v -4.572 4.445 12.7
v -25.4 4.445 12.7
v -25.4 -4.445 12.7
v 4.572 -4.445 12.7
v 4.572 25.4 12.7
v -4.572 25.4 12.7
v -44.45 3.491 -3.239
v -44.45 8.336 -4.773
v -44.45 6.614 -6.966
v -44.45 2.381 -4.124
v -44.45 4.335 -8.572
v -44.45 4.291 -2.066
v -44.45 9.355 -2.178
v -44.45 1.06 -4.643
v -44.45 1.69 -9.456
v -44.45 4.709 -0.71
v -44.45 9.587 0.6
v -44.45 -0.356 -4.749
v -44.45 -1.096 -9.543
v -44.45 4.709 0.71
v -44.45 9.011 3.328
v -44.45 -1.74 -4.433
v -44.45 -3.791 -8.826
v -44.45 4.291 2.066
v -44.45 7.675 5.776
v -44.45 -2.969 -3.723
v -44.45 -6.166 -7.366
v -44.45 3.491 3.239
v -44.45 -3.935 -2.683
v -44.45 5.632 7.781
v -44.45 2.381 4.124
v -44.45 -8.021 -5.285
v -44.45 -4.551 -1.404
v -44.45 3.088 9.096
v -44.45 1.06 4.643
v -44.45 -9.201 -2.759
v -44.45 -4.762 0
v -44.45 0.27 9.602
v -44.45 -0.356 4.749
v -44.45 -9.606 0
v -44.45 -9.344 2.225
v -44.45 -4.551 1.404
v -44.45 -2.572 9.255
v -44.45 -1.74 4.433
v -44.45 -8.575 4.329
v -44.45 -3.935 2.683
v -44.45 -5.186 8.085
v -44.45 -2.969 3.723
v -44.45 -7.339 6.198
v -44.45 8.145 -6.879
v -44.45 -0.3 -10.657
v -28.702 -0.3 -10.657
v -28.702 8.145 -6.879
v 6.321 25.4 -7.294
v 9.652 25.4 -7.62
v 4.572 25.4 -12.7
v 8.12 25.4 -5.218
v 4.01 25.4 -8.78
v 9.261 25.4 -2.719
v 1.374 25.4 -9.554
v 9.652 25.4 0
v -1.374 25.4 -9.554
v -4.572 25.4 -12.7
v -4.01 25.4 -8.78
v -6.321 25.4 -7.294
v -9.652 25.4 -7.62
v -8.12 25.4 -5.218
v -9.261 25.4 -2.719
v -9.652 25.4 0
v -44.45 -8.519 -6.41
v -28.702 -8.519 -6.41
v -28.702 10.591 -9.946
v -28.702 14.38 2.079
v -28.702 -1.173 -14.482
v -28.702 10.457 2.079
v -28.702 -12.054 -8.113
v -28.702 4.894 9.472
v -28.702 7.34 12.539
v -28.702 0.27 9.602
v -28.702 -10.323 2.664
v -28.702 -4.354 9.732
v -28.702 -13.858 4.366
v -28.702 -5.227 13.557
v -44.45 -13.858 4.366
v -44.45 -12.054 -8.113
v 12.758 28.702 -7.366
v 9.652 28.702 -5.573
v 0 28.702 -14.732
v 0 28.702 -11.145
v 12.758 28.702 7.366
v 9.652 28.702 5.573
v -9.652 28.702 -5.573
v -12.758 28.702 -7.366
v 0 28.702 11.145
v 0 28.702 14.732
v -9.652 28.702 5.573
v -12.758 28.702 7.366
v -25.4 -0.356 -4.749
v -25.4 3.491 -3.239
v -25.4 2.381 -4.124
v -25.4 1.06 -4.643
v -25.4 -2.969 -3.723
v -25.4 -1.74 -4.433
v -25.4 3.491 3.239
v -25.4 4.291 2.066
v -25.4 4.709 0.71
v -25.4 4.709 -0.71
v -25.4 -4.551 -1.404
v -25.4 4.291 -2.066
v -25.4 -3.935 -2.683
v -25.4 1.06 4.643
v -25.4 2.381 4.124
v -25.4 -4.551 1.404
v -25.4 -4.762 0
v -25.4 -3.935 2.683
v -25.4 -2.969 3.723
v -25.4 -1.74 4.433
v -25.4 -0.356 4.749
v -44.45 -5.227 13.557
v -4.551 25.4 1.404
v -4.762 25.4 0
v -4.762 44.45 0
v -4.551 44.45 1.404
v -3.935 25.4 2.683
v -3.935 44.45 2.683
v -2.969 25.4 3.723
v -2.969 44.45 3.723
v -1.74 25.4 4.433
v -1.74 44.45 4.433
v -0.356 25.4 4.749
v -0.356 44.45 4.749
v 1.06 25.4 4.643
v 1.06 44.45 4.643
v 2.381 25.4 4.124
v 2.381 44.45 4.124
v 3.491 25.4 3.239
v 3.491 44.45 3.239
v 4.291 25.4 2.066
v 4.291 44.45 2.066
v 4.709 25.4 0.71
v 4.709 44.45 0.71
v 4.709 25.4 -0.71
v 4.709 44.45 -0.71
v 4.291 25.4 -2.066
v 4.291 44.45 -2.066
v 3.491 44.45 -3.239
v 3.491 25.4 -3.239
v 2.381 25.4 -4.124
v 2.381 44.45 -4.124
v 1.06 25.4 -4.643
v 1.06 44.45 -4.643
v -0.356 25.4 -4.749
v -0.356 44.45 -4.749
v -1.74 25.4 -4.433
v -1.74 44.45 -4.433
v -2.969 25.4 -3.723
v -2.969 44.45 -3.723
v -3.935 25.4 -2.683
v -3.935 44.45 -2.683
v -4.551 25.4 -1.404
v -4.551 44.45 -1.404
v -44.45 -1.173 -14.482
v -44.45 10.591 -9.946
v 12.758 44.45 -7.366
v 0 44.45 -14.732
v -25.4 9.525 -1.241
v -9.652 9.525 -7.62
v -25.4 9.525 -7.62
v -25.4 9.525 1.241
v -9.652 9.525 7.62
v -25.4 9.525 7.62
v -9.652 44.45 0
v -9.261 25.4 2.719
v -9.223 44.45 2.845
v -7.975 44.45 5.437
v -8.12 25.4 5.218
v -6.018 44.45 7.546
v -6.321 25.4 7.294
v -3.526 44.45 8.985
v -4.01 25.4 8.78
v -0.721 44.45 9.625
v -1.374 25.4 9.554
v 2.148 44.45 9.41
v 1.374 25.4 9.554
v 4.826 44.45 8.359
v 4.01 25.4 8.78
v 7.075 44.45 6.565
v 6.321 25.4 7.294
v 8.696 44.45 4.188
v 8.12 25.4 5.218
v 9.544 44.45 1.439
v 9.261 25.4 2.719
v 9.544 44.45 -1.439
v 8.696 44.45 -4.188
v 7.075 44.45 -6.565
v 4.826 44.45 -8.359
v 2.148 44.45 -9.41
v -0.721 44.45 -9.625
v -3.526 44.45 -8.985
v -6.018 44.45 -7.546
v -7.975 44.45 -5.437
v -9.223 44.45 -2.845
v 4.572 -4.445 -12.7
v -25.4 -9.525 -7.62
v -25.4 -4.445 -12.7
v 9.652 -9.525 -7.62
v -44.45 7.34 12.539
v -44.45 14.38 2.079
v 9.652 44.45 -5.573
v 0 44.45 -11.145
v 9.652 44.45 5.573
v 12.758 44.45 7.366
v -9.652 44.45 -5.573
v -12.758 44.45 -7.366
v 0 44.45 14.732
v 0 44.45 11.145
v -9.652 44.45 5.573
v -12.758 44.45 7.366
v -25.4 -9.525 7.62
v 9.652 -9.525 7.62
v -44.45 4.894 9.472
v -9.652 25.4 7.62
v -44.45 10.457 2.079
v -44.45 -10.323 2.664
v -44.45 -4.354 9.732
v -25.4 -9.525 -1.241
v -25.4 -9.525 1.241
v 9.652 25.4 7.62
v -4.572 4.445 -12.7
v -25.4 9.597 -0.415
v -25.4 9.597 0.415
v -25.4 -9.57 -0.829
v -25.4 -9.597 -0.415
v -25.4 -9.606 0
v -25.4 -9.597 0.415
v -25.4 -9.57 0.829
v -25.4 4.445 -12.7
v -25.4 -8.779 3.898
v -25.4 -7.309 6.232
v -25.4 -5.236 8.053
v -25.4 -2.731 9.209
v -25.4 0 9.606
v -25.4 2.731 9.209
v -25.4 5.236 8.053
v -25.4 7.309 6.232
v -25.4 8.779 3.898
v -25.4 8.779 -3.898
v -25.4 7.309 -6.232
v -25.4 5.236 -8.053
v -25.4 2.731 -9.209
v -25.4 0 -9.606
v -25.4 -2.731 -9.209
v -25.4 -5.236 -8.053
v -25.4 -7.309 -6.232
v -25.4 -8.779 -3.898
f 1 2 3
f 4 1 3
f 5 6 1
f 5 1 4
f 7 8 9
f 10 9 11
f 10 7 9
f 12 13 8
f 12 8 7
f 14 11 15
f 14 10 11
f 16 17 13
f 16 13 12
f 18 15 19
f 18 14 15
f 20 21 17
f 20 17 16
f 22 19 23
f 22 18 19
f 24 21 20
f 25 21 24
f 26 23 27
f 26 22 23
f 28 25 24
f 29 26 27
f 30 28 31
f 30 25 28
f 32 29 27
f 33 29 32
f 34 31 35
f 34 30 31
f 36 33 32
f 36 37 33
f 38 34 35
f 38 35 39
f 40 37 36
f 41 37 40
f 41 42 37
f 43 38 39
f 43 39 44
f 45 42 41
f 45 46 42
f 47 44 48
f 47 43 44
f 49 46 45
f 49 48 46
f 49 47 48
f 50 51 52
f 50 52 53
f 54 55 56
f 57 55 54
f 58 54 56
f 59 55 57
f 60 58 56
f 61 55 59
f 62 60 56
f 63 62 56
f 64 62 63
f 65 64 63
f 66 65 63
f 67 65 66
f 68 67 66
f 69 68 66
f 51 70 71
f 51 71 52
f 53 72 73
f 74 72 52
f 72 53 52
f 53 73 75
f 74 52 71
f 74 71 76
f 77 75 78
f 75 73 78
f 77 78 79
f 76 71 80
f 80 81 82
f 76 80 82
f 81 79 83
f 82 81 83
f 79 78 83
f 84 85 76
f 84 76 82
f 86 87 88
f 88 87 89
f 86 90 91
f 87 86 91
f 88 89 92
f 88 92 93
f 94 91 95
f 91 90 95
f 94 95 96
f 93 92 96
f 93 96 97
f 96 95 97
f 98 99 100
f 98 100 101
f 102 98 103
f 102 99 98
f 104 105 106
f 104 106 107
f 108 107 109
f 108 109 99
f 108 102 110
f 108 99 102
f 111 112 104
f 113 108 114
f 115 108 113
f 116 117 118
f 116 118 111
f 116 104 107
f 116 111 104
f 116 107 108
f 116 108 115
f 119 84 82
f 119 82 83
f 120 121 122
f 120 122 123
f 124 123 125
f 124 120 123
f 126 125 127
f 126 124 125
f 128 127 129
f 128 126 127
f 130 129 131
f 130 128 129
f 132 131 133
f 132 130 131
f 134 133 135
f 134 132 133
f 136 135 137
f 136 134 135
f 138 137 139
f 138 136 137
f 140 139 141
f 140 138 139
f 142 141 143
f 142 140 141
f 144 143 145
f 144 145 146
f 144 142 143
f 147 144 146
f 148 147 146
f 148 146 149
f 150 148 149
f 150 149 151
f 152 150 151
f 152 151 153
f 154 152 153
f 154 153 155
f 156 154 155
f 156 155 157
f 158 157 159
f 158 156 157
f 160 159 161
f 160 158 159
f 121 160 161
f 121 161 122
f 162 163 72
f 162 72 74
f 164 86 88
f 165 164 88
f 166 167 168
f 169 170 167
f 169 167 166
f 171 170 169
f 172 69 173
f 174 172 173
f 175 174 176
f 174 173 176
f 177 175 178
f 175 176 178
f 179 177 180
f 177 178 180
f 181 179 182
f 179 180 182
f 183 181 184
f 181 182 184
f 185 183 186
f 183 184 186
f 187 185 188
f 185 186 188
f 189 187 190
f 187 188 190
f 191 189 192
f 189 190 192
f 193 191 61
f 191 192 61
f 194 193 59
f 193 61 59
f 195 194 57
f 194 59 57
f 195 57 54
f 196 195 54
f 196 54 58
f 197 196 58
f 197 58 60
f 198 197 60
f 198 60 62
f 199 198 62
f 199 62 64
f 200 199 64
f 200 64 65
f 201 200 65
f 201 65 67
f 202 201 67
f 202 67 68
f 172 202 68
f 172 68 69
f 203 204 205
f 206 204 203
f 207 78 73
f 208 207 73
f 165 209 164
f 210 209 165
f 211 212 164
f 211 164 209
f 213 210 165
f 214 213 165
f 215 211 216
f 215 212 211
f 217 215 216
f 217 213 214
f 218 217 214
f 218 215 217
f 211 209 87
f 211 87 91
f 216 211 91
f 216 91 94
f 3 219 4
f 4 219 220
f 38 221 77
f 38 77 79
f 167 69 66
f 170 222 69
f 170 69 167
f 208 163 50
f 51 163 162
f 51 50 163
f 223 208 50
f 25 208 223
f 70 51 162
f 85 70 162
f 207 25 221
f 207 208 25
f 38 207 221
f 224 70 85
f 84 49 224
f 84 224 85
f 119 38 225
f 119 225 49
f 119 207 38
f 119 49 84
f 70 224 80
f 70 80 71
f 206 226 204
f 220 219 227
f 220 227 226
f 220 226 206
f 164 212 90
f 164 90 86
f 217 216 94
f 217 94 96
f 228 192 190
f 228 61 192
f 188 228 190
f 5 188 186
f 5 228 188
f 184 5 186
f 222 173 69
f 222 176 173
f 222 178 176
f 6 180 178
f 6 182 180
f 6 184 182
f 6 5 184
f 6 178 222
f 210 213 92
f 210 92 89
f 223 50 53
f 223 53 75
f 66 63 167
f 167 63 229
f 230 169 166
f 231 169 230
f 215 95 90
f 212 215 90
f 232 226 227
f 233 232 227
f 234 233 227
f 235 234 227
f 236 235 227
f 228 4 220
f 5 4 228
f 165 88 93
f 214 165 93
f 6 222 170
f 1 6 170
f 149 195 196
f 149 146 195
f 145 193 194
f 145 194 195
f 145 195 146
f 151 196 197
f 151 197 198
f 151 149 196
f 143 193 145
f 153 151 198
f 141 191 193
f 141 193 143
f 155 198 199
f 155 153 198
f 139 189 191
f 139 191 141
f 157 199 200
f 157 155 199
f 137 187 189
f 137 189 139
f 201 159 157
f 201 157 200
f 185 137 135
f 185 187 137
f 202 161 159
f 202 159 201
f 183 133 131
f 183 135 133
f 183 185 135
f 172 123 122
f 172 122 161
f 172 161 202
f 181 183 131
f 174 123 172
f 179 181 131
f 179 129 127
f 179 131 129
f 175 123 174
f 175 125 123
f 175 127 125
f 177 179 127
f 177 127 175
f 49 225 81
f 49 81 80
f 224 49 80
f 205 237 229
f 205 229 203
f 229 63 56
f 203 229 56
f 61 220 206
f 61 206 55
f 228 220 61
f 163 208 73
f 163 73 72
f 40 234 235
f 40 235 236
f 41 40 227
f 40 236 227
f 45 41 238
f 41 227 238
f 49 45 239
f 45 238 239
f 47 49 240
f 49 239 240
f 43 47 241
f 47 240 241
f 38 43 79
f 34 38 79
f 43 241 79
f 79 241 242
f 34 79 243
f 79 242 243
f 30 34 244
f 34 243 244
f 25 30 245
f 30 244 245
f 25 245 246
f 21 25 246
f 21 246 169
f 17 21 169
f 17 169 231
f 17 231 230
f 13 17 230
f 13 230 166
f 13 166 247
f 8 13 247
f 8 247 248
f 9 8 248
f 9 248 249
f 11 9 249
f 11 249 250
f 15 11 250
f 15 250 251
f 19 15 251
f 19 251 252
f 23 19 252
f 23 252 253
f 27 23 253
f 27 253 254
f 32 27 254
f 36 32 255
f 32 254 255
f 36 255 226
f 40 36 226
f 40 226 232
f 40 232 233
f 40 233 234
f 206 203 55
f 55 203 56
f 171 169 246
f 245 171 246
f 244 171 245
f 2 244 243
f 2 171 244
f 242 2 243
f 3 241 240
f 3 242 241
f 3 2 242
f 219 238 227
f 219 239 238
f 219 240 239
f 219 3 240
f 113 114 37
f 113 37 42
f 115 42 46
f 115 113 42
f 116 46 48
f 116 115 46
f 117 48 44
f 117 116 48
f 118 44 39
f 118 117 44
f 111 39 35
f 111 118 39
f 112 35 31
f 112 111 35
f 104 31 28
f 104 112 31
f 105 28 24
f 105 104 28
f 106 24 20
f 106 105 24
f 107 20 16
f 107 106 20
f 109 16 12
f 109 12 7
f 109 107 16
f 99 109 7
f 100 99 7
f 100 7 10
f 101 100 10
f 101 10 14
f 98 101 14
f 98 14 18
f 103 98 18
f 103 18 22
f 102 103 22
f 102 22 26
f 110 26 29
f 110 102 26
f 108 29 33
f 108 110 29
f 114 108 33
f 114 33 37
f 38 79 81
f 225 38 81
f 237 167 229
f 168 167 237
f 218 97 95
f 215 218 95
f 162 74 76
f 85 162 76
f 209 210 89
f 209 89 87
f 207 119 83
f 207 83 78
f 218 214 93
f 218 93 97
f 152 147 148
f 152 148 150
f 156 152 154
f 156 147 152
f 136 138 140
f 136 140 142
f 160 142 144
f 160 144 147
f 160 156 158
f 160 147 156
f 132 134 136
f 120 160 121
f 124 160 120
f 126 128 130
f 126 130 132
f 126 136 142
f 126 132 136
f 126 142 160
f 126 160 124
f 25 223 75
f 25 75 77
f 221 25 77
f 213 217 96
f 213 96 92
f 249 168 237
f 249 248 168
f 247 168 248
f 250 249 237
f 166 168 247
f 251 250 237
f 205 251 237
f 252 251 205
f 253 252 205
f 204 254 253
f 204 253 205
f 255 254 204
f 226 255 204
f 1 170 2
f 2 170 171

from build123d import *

# Parameters (mm, degrees)
F1_DEPTH = 12.7
F2_R     = 9.605515
F2_R_2   = 4.7625
F3_DEPTH = 19.05
F5_DEPTH = 15.748
F6_R     = 9.652
F6_R_2   = 4.7625
F7_DEPTH = 19.05
F9_DEPTH = 15.748
F10_SIZE = 5.08


with BuildPart() as f1:
    # F0 (on Top) → F1 (new body, symmetric)
    with BuildSketch(Plane.XY):
        Polygon((-9.652, 9.525), (-25.4, 9.525), (-25.4, 0), (-25.4, -9.525), (9.652, -9.525), (9.652, 9.525), (9.652, 25.4), (0, 25.4), (-9.652, 25.4), align=None)
    extrude(amount=F1_DEPTH, both=True)

    # F2 (on face) → F3 (join)
    with BuildSketch(Plane(origin=(-25.4, 0, 0), x_dir=(0, -1, 0), z_dir=(-1, 0, 0))):
        Circle(F2_R)
        Circle(F2_R_2, mode=Mode.SUBTRACT)
    extrude(amount=F3_DEPTH)

    # F4 (on face) → F5 (join)
    with BuildSketch(Plane(origin=(-44.45, 0, 0), x_dir=(0, -1, 0), z_dir=(-1, 0, 0))):
        Polygon((12.053703, -8.112624), (13.858066, 4.365827), (5.227022, 13.55672), (-7.340076, 12.539127), (-14.379947, 2.079315), (-10.591424, -9.946263), (1.172657, -14.482103), align=None)
        Polygon((4.353991, 9.731724), (10.323238, 2.663543), (8.518875, -6.41034), (0.299626, -10.657107), (-8.145248, -6.878854), (-10.456584, 2.079315), (-4.893899, 9.471718), align=None, mode=Mode.SUBTRACT)
    extrude(amount=-F5_DEPTH)

    # F6 (on face) → F7 (join)
    with BuildSketch(Plane(origin=(0, 25.4, 0), x_dir=(-1, 0, 0), z_dir=(0, 1, 0))):
        Circle(F6_R)
        Circle(F6_R_2, mode=Mode.SUBTRACT)
    extrude(amount=F7_DEPTH)

    # F10
    f10_edges = [f1.edges().sort_by_distance(p)[0] for p in [
        (-17.526, 9.525, 12.7),
        (-7.874, -9.525, 12.7),
        (-9.652, 17.4625, 12.7),
        (9.652, 7.9375, 12.7),
        (9.652, 7.9375, -12.7),
        (-17.526, 9.525, -12.7),
        (-9.652, 17.4625, -12.7),
        (-7.874, -9.525, -12.7),
    ]]
    chamfer(f10_edges, length=F10_SIZE)


with BuildPart() as f9:
    # F8 (on face) → F9 (new body)
    with BuildSketch(Plane(origin=(0, 44.45, 0), x_dir=(-1, 0, 0), z_dir=(0, 1, 0))):
        Polygon((12.758085, -7.365884), (12.758085, 7.365884), (0, 14.731767), (-12.758085, 7.365884), (-12.758085, -7.365884), (0, -14.731767), align=None)
        Polygon((0, 11.14517), (9.652, 5.572585), (9.652, -5.572585), (0, -11.14517), (-9.652, -5.572585), (-9.652, 5.572585), align=None, mode=Mode.SUBTRACT)
    extrude(amount=-F9_DEPTH)


solid = Compound([f1.part, f9.part])
